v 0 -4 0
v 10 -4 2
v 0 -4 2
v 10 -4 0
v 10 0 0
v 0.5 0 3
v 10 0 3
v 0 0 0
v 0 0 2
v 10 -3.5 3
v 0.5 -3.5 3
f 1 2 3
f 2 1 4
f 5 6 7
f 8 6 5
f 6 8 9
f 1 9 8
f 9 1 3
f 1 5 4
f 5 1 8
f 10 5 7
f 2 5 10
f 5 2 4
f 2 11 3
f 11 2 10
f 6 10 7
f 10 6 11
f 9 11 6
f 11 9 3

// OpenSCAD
difference() {
  rotate([90,0,90])
  linear_extrude(height=10)
  polygon(points=[[-4,0],[0,0],[0,3],[-3.5,3],[-4,2]]);

  rotate([90,0,0])
  linear_extrude(height=4)
  polygon(points=[[0,3],[0.5,3],[0,2]]);

}
